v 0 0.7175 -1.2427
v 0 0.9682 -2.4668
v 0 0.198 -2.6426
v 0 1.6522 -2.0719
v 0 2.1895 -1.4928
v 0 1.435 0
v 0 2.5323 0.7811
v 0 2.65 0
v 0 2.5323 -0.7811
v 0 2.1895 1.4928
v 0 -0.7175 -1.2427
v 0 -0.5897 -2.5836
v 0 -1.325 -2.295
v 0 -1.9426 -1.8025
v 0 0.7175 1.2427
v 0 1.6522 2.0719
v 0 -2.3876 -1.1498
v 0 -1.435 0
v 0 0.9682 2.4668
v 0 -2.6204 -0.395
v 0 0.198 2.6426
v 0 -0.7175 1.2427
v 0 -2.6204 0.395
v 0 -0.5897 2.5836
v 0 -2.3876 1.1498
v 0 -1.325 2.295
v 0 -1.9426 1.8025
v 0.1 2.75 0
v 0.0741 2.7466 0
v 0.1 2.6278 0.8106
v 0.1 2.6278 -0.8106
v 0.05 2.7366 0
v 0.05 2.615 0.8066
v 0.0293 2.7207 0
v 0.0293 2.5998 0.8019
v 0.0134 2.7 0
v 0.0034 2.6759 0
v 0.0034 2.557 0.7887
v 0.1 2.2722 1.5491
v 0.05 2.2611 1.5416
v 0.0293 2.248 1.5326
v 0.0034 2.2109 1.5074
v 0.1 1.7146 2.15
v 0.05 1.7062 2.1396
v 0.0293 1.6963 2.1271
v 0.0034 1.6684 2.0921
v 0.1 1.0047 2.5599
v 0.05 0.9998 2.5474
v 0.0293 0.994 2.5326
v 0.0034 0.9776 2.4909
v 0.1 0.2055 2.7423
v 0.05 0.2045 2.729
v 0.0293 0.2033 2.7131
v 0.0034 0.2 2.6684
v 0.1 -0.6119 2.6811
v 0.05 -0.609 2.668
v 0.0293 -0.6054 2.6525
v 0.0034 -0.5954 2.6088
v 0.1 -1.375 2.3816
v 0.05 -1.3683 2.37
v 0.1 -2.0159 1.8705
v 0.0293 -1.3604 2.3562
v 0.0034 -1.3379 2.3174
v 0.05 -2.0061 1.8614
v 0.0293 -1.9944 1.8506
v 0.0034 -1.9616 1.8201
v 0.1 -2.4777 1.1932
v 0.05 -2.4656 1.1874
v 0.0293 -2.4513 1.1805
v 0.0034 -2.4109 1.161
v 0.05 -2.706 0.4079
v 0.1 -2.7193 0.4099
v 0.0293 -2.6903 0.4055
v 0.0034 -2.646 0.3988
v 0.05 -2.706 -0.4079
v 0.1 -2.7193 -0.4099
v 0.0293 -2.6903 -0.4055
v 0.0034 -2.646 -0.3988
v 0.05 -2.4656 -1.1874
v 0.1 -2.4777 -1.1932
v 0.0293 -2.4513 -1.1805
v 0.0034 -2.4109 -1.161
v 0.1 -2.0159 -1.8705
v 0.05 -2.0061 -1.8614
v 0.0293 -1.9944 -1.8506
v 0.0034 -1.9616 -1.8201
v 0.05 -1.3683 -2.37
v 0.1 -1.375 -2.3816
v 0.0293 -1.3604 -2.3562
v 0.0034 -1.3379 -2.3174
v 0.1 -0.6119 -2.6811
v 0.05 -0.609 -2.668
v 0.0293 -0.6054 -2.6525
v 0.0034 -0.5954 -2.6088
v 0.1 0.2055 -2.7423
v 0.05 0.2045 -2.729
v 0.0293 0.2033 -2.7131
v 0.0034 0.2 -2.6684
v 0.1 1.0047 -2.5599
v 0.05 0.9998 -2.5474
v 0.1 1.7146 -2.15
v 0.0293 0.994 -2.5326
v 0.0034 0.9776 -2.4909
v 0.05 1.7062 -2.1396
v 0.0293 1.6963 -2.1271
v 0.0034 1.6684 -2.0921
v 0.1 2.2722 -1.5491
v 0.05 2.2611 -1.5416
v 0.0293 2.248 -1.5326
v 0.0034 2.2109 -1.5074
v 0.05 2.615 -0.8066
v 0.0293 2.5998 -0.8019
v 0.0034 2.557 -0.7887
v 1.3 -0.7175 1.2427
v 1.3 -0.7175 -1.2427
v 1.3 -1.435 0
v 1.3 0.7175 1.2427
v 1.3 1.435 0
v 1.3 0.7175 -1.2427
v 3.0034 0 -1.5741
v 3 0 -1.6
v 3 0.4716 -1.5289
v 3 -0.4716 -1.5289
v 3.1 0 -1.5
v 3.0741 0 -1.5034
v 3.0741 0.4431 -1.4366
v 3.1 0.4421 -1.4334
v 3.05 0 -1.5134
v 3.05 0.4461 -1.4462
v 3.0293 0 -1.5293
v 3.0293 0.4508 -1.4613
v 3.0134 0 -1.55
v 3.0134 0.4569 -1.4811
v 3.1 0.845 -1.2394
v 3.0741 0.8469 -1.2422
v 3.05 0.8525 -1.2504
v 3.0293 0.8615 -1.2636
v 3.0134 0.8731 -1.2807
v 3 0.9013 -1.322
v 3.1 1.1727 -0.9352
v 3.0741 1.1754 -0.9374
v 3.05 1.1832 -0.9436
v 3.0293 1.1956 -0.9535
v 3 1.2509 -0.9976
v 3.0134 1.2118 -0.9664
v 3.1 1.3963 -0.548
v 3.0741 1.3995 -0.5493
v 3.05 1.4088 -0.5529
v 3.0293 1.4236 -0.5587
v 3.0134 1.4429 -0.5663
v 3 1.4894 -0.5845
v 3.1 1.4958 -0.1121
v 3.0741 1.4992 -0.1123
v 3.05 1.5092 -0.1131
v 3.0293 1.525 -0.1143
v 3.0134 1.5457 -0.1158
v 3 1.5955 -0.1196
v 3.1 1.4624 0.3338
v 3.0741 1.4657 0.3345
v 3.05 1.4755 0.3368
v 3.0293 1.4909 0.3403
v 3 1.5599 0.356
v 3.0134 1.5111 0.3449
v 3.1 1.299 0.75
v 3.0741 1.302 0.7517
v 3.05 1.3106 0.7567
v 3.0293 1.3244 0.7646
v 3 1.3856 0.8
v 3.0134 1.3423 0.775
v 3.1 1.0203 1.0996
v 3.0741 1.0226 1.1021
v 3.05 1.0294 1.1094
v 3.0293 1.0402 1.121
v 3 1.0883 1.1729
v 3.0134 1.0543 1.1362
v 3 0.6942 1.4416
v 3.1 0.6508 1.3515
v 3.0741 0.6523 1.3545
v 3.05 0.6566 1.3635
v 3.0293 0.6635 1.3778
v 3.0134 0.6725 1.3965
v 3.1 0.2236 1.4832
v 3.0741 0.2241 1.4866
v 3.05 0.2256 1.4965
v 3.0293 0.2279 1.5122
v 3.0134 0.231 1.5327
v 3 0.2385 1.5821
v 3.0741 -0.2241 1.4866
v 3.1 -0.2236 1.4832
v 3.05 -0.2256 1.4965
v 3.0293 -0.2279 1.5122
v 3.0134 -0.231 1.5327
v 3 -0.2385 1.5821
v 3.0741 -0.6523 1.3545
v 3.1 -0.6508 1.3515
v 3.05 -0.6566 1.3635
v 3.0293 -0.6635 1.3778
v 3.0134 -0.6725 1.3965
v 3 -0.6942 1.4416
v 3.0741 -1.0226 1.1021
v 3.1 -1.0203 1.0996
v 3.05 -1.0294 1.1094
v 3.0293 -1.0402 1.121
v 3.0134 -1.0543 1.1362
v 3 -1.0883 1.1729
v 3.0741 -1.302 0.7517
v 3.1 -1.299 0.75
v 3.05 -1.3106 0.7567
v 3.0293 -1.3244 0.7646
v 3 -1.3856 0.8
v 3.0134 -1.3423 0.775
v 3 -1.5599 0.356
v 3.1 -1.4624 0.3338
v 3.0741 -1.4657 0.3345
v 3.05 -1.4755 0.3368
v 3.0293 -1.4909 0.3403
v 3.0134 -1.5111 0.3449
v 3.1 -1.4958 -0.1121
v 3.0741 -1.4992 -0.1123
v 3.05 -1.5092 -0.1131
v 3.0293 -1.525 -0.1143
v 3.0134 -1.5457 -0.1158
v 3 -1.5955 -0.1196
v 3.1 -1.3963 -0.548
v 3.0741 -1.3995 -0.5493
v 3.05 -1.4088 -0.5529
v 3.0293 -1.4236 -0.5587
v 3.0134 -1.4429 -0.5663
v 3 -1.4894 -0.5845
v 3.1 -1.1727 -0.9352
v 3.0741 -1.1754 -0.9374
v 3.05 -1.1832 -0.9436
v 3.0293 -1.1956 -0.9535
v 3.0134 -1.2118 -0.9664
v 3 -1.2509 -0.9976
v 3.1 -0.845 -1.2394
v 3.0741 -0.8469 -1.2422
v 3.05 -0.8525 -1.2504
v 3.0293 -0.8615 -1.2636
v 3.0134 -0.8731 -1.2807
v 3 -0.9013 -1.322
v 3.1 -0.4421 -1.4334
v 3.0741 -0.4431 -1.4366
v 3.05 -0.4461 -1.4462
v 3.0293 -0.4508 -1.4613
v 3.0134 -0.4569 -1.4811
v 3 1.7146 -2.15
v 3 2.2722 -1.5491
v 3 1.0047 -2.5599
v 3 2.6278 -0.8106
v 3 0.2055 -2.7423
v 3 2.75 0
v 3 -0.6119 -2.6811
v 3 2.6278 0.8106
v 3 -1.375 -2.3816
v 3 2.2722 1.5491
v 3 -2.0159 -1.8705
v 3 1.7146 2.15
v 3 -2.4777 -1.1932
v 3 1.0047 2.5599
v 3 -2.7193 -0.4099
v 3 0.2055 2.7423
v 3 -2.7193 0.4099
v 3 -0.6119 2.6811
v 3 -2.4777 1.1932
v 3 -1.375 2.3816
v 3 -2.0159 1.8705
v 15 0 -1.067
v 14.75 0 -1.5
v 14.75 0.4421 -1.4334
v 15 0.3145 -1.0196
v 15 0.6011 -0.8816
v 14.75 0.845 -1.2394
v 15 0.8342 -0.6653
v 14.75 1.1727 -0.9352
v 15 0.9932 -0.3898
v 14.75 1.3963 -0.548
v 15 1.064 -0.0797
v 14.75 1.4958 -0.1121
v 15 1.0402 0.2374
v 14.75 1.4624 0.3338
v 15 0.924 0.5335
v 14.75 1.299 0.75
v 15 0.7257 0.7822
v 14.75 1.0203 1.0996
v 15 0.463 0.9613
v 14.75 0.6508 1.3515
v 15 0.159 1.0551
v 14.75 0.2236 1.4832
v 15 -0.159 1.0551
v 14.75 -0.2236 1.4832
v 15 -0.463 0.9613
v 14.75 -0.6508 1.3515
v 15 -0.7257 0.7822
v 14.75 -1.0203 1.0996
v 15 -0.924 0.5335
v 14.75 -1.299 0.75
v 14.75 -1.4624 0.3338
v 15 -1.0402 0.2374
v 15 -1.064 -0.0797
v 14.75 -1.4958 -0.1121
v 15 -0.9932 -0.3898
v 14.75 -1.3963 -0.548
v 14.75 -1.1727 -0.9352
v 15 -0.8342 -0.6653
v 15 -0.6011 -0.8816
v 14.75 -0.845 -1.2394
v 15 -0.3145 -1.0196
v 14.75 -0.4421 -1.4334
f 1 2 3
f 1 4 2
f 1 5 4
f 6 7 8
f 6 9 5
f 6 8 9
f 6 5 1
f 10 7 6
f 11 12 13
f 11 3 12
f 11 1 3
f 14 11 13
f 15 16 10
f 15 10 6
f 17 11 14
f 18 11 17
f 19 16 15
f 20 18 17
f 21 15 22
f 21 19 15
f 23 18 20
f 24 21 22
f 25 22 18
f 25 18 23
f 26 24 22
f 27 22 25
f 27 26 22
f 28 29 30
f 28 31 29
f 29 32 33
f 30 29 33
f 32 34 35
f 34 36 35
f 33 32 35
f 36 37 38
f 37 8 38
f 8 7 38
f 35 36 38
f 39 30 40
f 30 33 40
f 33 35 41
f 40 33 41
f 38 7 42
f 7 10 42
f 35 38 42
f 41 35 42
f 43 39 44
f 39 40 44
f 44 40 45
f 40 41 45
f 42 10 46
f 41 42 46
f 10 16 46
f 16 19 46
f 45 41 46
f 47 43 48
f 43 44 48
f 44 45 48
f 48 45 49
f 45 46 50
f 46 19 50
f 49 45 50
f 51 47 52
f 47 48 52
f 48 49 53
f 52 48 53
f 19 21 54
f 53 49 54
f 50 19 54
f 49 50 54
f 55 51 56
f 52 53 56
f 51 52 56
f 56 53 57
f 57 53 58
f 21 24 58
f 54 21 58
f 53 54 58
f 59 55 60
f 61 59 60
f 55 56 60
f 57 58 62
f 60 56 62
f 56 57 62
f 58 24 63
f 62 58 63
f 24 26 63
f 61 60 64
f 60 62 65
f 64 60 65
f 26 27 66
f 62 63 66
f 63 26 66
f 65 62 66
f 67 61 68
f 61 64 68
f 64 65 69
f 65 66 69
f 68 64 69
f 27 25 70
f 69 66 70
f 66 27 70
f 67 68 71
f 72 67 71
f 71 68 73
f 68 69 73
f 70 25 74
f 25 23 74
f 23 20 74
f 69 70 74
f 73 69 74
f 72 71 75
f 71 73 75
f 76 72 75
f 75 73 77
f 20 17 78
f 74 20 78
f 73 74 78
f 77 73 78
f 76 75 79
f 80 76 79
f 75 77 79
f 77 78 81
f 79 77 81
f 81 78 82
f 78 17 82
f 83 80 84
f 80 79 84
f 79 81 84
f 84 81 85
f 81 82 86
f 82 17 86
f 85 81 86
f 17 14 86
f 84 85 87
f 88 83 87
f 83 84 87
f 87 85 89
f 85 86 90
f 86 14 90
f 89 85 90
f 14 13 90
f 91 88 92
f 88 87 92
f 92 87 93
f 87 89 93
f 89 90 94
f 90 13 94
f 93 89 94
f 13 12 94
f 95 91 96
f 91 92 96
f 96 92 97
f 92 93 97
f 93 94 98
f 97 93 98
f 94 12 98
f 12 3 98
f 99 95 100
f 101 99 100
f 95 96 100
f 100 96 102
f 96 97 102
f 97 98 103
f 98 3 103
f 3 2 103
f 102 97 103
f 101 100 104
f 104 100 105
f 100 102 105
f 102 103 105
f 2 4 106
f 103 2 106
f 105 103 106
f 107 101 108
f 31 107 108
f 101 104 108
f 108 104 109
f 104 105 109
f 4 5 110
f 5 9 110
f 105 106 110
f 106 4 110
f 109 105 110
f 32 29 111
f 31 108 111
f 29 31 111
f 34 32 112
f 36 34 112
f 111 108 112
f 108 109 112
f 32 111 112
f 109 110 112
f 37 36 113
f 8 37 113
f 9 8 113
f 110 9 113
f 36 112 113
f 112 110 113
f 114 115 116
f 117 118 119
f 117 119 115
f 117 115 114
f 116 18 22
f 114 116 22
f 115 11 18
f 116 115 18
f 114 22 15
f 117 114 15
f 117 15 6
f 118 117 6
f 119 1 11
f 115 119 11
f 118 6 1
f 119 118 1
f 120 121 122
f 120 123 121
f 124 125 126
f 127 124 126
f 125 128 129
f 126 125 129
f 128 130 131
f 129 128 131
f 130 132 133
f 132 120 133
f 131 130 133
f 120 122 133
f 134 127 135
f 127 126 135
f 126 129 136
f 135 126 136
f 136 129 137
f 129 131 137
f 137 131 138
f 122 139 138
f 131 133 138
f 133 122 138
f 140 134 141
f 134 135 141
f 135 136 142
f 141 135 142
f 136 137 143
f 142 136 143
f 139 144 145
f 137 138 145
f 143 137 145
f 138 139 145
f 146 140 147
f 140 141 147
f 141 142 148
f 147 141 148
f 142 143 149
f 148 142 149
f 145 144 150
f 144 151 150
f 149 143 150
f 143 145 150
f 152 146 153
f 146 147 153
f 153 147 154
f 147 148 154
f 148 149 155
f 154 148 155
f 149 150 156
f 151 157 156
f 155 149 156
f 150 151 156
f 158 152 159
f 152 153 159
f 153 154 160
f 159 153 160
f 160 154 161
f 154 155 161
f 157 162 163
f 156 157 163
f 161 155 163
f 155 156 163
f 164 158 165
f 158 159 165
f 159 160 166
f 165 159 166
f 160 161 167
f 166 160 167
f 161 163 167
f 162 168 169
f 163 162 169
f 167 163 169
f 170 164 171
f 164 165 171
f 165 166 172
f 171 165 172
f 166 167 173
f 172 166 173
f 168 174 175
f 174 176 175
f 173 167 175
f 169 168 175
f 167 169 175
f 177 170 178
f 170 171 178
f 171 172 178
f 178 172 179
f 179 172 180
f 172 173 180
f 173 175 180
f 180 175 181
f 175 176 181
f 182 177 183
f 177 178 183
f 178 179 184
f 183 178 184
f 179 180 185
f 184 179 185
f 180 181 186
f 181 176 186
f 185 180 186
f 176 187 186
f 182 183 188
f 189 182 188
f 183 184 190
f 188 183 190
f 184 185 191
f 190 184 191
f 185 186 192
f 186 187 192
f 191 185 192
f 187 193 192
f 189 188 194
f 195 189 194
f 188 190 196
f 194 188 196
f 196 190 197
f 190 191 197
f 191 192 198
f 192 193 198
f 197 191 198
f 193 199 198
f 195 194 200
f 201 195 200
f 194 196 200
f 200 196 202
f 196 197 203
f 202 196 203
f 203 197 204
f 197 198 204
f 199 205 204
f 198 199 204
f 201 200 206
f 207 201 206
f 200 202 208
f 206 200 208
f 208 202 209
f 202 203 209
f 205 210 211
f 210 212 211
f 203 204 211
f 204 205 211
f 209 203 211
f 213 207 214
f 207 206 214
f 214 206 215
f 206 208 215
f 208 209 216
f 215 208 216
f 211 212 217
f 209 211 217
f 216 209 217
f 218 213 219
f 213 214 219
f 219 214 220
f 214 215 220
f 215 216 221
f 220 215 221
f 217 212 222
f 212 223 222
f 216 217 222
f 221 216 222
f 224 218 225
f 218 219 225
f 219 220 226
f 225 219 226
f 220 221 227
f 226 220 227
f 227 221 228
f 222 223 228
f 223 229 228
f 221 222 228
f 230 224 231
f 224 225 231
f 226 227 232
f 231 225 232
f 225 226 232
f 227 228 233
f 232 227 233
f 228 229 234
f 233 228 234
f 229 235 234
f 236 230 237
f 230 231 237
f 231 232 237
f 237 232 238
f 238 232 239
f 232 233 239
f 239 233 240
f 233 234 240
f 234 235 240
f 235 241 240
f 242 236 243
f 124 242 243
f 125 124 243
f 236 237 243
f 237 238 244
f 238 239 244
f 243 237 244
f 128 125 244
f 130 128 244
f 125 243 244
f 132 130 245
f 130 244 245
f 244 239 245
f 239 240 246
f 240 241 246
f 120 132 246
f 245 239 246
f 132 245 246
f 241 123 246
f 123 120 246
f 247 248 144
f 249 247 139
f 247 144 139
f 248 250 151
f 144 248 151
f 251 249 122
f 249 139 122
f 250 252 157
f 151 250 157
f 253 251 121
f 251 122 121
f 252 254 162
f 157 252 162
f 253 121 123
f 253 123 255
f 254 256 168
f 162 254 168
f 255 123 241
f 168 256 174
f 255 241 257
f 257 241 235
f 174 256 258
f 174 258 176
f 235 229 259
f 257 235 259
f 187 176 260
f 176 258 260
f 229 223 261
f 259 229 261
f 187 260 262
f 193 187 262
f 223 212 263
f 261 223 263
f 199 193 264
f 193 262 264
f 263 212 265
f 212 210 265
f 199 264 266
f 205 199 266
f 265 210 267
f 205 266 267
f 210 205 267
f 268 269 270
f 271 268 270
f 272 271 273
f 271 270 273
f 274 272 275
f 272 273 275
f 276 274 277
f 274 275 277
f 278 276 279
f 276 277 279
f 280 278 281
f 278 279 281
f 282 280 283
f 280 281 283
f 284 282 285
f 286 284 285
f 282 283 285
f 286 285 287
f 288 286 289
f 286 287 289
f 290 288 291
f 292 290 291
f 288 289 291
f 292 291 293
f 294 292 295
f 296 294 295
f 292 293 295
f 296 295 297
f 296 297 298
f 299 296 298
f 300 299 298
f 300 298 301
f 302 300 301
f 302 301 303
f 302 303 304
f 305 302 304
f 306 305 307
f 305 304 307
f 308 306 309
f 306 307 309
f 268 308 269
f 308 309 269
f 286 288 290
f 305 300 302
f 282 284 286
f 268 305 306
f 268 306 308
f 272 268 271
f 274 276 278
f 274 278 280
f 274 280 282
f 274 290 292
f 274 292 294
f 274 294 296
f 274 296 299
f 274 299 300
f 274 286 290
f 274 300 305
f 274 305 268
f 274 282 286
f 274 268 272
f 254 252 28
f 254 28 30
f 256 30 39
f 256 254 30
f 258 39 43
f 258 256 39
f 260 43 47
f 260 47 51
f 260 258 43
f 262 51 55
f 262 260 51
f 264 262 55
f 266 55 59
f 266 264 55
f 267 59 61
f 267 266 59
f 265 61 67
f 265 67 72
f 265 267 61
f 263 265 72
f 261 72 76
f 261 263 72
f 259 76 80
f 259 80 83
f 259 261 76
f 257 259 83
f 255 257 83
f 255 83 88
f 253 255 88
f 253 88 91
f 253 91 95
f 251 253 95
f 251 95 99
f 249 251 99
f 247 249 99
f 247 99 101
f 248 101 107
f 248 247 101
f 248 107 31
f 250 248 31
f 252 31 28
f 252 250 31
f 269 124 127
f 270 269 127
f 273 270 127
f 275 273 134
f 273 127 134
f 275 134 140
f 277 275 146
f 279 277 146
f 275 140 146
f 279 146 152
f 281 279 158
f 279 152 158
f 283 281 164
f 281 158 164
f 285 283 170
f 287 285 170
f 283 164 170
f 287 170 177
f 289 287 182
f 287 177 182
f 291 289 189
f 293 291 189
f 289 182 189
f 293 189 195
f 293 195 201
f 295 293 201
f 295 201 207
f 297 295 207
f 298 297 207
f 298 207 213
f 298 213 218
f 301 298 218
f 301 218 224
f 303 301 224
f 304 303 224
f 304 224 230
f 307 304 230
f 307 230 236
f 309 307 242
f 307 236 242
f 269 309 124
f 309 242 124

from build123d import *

# Parameters (mm, degrees)
SKETCH_1_W          = 3
SKETCH_1_H          = 2.75
SKETCH_2_R          = 1.5
EXTRUDE_1_DEPTH     = 12
CUT_EXTRUDE_1_DEPTH = 1.3
CHAMFER_1_SIZE      = 0.433
CHAMFER_1_SIZE2     = 0.25
FILLET_1_R          = 0.1


with BuildPart() as part:
    # 草图1 → 旋转1 (revolve)
    with BuildSketch(Plane.XY):
        with Locations((1.5, 1.375)):
            Rectangle(SKETCH_1_W, SKETCH_1_H)
    revolve(axis=Axis((0, 0, 0), (1, 0, 0)))

    # 草图2 → 凸台-拉伸1 (add)
    with BuildSketch(Plane(origin=(3, 0, 0), x_dir=(0, 0, -1), z_dir=(1, 0, 0))):
        Circle(SKETCH_2_R)
    extrude(amount=EXTRUDE_1_DEPTH)

    # 草图3 → 切除-拉伸1 (cut)
    with BuildSketch(Plane.ZY):
        Polygon((0, 1.435), (-1.242746454, 0.7175), (-1.242746454, -0.7175), (0, -1.435), (1.242746454, -0.7175), (1.242746454, 0.7175), align=None)
    extrude(amount=-CUT_EXTRUDE_1_DEPTH, mode=Mode.SUBTRACT)

    # 倒角1
    chamfer_1_edges = [part.edges().sort_by_distance(p)[0] for p in [
        (15, 0, 1.5),
    ]]
    chamfer_1_side = [part.faces().sort_by_distance(p)[0] for p in [
        (15, 0, 0),
    ]]
    chamfer(chamfer_1_edges, length=CHAMFER_1_SIZE, length2=CHAMFER_1_SIZE2, reference=chamfer_1_side[0])

    # 圆角1
    fillet_1_edges = [part.edges().sort_by_distance(p)[0] for p in [
        (0, -2.75, 0),
        (3, 0, 1.5),
    ]]
    fillet(fillet_1_edges, radius=FILLET_1_R)


solid = part.part
